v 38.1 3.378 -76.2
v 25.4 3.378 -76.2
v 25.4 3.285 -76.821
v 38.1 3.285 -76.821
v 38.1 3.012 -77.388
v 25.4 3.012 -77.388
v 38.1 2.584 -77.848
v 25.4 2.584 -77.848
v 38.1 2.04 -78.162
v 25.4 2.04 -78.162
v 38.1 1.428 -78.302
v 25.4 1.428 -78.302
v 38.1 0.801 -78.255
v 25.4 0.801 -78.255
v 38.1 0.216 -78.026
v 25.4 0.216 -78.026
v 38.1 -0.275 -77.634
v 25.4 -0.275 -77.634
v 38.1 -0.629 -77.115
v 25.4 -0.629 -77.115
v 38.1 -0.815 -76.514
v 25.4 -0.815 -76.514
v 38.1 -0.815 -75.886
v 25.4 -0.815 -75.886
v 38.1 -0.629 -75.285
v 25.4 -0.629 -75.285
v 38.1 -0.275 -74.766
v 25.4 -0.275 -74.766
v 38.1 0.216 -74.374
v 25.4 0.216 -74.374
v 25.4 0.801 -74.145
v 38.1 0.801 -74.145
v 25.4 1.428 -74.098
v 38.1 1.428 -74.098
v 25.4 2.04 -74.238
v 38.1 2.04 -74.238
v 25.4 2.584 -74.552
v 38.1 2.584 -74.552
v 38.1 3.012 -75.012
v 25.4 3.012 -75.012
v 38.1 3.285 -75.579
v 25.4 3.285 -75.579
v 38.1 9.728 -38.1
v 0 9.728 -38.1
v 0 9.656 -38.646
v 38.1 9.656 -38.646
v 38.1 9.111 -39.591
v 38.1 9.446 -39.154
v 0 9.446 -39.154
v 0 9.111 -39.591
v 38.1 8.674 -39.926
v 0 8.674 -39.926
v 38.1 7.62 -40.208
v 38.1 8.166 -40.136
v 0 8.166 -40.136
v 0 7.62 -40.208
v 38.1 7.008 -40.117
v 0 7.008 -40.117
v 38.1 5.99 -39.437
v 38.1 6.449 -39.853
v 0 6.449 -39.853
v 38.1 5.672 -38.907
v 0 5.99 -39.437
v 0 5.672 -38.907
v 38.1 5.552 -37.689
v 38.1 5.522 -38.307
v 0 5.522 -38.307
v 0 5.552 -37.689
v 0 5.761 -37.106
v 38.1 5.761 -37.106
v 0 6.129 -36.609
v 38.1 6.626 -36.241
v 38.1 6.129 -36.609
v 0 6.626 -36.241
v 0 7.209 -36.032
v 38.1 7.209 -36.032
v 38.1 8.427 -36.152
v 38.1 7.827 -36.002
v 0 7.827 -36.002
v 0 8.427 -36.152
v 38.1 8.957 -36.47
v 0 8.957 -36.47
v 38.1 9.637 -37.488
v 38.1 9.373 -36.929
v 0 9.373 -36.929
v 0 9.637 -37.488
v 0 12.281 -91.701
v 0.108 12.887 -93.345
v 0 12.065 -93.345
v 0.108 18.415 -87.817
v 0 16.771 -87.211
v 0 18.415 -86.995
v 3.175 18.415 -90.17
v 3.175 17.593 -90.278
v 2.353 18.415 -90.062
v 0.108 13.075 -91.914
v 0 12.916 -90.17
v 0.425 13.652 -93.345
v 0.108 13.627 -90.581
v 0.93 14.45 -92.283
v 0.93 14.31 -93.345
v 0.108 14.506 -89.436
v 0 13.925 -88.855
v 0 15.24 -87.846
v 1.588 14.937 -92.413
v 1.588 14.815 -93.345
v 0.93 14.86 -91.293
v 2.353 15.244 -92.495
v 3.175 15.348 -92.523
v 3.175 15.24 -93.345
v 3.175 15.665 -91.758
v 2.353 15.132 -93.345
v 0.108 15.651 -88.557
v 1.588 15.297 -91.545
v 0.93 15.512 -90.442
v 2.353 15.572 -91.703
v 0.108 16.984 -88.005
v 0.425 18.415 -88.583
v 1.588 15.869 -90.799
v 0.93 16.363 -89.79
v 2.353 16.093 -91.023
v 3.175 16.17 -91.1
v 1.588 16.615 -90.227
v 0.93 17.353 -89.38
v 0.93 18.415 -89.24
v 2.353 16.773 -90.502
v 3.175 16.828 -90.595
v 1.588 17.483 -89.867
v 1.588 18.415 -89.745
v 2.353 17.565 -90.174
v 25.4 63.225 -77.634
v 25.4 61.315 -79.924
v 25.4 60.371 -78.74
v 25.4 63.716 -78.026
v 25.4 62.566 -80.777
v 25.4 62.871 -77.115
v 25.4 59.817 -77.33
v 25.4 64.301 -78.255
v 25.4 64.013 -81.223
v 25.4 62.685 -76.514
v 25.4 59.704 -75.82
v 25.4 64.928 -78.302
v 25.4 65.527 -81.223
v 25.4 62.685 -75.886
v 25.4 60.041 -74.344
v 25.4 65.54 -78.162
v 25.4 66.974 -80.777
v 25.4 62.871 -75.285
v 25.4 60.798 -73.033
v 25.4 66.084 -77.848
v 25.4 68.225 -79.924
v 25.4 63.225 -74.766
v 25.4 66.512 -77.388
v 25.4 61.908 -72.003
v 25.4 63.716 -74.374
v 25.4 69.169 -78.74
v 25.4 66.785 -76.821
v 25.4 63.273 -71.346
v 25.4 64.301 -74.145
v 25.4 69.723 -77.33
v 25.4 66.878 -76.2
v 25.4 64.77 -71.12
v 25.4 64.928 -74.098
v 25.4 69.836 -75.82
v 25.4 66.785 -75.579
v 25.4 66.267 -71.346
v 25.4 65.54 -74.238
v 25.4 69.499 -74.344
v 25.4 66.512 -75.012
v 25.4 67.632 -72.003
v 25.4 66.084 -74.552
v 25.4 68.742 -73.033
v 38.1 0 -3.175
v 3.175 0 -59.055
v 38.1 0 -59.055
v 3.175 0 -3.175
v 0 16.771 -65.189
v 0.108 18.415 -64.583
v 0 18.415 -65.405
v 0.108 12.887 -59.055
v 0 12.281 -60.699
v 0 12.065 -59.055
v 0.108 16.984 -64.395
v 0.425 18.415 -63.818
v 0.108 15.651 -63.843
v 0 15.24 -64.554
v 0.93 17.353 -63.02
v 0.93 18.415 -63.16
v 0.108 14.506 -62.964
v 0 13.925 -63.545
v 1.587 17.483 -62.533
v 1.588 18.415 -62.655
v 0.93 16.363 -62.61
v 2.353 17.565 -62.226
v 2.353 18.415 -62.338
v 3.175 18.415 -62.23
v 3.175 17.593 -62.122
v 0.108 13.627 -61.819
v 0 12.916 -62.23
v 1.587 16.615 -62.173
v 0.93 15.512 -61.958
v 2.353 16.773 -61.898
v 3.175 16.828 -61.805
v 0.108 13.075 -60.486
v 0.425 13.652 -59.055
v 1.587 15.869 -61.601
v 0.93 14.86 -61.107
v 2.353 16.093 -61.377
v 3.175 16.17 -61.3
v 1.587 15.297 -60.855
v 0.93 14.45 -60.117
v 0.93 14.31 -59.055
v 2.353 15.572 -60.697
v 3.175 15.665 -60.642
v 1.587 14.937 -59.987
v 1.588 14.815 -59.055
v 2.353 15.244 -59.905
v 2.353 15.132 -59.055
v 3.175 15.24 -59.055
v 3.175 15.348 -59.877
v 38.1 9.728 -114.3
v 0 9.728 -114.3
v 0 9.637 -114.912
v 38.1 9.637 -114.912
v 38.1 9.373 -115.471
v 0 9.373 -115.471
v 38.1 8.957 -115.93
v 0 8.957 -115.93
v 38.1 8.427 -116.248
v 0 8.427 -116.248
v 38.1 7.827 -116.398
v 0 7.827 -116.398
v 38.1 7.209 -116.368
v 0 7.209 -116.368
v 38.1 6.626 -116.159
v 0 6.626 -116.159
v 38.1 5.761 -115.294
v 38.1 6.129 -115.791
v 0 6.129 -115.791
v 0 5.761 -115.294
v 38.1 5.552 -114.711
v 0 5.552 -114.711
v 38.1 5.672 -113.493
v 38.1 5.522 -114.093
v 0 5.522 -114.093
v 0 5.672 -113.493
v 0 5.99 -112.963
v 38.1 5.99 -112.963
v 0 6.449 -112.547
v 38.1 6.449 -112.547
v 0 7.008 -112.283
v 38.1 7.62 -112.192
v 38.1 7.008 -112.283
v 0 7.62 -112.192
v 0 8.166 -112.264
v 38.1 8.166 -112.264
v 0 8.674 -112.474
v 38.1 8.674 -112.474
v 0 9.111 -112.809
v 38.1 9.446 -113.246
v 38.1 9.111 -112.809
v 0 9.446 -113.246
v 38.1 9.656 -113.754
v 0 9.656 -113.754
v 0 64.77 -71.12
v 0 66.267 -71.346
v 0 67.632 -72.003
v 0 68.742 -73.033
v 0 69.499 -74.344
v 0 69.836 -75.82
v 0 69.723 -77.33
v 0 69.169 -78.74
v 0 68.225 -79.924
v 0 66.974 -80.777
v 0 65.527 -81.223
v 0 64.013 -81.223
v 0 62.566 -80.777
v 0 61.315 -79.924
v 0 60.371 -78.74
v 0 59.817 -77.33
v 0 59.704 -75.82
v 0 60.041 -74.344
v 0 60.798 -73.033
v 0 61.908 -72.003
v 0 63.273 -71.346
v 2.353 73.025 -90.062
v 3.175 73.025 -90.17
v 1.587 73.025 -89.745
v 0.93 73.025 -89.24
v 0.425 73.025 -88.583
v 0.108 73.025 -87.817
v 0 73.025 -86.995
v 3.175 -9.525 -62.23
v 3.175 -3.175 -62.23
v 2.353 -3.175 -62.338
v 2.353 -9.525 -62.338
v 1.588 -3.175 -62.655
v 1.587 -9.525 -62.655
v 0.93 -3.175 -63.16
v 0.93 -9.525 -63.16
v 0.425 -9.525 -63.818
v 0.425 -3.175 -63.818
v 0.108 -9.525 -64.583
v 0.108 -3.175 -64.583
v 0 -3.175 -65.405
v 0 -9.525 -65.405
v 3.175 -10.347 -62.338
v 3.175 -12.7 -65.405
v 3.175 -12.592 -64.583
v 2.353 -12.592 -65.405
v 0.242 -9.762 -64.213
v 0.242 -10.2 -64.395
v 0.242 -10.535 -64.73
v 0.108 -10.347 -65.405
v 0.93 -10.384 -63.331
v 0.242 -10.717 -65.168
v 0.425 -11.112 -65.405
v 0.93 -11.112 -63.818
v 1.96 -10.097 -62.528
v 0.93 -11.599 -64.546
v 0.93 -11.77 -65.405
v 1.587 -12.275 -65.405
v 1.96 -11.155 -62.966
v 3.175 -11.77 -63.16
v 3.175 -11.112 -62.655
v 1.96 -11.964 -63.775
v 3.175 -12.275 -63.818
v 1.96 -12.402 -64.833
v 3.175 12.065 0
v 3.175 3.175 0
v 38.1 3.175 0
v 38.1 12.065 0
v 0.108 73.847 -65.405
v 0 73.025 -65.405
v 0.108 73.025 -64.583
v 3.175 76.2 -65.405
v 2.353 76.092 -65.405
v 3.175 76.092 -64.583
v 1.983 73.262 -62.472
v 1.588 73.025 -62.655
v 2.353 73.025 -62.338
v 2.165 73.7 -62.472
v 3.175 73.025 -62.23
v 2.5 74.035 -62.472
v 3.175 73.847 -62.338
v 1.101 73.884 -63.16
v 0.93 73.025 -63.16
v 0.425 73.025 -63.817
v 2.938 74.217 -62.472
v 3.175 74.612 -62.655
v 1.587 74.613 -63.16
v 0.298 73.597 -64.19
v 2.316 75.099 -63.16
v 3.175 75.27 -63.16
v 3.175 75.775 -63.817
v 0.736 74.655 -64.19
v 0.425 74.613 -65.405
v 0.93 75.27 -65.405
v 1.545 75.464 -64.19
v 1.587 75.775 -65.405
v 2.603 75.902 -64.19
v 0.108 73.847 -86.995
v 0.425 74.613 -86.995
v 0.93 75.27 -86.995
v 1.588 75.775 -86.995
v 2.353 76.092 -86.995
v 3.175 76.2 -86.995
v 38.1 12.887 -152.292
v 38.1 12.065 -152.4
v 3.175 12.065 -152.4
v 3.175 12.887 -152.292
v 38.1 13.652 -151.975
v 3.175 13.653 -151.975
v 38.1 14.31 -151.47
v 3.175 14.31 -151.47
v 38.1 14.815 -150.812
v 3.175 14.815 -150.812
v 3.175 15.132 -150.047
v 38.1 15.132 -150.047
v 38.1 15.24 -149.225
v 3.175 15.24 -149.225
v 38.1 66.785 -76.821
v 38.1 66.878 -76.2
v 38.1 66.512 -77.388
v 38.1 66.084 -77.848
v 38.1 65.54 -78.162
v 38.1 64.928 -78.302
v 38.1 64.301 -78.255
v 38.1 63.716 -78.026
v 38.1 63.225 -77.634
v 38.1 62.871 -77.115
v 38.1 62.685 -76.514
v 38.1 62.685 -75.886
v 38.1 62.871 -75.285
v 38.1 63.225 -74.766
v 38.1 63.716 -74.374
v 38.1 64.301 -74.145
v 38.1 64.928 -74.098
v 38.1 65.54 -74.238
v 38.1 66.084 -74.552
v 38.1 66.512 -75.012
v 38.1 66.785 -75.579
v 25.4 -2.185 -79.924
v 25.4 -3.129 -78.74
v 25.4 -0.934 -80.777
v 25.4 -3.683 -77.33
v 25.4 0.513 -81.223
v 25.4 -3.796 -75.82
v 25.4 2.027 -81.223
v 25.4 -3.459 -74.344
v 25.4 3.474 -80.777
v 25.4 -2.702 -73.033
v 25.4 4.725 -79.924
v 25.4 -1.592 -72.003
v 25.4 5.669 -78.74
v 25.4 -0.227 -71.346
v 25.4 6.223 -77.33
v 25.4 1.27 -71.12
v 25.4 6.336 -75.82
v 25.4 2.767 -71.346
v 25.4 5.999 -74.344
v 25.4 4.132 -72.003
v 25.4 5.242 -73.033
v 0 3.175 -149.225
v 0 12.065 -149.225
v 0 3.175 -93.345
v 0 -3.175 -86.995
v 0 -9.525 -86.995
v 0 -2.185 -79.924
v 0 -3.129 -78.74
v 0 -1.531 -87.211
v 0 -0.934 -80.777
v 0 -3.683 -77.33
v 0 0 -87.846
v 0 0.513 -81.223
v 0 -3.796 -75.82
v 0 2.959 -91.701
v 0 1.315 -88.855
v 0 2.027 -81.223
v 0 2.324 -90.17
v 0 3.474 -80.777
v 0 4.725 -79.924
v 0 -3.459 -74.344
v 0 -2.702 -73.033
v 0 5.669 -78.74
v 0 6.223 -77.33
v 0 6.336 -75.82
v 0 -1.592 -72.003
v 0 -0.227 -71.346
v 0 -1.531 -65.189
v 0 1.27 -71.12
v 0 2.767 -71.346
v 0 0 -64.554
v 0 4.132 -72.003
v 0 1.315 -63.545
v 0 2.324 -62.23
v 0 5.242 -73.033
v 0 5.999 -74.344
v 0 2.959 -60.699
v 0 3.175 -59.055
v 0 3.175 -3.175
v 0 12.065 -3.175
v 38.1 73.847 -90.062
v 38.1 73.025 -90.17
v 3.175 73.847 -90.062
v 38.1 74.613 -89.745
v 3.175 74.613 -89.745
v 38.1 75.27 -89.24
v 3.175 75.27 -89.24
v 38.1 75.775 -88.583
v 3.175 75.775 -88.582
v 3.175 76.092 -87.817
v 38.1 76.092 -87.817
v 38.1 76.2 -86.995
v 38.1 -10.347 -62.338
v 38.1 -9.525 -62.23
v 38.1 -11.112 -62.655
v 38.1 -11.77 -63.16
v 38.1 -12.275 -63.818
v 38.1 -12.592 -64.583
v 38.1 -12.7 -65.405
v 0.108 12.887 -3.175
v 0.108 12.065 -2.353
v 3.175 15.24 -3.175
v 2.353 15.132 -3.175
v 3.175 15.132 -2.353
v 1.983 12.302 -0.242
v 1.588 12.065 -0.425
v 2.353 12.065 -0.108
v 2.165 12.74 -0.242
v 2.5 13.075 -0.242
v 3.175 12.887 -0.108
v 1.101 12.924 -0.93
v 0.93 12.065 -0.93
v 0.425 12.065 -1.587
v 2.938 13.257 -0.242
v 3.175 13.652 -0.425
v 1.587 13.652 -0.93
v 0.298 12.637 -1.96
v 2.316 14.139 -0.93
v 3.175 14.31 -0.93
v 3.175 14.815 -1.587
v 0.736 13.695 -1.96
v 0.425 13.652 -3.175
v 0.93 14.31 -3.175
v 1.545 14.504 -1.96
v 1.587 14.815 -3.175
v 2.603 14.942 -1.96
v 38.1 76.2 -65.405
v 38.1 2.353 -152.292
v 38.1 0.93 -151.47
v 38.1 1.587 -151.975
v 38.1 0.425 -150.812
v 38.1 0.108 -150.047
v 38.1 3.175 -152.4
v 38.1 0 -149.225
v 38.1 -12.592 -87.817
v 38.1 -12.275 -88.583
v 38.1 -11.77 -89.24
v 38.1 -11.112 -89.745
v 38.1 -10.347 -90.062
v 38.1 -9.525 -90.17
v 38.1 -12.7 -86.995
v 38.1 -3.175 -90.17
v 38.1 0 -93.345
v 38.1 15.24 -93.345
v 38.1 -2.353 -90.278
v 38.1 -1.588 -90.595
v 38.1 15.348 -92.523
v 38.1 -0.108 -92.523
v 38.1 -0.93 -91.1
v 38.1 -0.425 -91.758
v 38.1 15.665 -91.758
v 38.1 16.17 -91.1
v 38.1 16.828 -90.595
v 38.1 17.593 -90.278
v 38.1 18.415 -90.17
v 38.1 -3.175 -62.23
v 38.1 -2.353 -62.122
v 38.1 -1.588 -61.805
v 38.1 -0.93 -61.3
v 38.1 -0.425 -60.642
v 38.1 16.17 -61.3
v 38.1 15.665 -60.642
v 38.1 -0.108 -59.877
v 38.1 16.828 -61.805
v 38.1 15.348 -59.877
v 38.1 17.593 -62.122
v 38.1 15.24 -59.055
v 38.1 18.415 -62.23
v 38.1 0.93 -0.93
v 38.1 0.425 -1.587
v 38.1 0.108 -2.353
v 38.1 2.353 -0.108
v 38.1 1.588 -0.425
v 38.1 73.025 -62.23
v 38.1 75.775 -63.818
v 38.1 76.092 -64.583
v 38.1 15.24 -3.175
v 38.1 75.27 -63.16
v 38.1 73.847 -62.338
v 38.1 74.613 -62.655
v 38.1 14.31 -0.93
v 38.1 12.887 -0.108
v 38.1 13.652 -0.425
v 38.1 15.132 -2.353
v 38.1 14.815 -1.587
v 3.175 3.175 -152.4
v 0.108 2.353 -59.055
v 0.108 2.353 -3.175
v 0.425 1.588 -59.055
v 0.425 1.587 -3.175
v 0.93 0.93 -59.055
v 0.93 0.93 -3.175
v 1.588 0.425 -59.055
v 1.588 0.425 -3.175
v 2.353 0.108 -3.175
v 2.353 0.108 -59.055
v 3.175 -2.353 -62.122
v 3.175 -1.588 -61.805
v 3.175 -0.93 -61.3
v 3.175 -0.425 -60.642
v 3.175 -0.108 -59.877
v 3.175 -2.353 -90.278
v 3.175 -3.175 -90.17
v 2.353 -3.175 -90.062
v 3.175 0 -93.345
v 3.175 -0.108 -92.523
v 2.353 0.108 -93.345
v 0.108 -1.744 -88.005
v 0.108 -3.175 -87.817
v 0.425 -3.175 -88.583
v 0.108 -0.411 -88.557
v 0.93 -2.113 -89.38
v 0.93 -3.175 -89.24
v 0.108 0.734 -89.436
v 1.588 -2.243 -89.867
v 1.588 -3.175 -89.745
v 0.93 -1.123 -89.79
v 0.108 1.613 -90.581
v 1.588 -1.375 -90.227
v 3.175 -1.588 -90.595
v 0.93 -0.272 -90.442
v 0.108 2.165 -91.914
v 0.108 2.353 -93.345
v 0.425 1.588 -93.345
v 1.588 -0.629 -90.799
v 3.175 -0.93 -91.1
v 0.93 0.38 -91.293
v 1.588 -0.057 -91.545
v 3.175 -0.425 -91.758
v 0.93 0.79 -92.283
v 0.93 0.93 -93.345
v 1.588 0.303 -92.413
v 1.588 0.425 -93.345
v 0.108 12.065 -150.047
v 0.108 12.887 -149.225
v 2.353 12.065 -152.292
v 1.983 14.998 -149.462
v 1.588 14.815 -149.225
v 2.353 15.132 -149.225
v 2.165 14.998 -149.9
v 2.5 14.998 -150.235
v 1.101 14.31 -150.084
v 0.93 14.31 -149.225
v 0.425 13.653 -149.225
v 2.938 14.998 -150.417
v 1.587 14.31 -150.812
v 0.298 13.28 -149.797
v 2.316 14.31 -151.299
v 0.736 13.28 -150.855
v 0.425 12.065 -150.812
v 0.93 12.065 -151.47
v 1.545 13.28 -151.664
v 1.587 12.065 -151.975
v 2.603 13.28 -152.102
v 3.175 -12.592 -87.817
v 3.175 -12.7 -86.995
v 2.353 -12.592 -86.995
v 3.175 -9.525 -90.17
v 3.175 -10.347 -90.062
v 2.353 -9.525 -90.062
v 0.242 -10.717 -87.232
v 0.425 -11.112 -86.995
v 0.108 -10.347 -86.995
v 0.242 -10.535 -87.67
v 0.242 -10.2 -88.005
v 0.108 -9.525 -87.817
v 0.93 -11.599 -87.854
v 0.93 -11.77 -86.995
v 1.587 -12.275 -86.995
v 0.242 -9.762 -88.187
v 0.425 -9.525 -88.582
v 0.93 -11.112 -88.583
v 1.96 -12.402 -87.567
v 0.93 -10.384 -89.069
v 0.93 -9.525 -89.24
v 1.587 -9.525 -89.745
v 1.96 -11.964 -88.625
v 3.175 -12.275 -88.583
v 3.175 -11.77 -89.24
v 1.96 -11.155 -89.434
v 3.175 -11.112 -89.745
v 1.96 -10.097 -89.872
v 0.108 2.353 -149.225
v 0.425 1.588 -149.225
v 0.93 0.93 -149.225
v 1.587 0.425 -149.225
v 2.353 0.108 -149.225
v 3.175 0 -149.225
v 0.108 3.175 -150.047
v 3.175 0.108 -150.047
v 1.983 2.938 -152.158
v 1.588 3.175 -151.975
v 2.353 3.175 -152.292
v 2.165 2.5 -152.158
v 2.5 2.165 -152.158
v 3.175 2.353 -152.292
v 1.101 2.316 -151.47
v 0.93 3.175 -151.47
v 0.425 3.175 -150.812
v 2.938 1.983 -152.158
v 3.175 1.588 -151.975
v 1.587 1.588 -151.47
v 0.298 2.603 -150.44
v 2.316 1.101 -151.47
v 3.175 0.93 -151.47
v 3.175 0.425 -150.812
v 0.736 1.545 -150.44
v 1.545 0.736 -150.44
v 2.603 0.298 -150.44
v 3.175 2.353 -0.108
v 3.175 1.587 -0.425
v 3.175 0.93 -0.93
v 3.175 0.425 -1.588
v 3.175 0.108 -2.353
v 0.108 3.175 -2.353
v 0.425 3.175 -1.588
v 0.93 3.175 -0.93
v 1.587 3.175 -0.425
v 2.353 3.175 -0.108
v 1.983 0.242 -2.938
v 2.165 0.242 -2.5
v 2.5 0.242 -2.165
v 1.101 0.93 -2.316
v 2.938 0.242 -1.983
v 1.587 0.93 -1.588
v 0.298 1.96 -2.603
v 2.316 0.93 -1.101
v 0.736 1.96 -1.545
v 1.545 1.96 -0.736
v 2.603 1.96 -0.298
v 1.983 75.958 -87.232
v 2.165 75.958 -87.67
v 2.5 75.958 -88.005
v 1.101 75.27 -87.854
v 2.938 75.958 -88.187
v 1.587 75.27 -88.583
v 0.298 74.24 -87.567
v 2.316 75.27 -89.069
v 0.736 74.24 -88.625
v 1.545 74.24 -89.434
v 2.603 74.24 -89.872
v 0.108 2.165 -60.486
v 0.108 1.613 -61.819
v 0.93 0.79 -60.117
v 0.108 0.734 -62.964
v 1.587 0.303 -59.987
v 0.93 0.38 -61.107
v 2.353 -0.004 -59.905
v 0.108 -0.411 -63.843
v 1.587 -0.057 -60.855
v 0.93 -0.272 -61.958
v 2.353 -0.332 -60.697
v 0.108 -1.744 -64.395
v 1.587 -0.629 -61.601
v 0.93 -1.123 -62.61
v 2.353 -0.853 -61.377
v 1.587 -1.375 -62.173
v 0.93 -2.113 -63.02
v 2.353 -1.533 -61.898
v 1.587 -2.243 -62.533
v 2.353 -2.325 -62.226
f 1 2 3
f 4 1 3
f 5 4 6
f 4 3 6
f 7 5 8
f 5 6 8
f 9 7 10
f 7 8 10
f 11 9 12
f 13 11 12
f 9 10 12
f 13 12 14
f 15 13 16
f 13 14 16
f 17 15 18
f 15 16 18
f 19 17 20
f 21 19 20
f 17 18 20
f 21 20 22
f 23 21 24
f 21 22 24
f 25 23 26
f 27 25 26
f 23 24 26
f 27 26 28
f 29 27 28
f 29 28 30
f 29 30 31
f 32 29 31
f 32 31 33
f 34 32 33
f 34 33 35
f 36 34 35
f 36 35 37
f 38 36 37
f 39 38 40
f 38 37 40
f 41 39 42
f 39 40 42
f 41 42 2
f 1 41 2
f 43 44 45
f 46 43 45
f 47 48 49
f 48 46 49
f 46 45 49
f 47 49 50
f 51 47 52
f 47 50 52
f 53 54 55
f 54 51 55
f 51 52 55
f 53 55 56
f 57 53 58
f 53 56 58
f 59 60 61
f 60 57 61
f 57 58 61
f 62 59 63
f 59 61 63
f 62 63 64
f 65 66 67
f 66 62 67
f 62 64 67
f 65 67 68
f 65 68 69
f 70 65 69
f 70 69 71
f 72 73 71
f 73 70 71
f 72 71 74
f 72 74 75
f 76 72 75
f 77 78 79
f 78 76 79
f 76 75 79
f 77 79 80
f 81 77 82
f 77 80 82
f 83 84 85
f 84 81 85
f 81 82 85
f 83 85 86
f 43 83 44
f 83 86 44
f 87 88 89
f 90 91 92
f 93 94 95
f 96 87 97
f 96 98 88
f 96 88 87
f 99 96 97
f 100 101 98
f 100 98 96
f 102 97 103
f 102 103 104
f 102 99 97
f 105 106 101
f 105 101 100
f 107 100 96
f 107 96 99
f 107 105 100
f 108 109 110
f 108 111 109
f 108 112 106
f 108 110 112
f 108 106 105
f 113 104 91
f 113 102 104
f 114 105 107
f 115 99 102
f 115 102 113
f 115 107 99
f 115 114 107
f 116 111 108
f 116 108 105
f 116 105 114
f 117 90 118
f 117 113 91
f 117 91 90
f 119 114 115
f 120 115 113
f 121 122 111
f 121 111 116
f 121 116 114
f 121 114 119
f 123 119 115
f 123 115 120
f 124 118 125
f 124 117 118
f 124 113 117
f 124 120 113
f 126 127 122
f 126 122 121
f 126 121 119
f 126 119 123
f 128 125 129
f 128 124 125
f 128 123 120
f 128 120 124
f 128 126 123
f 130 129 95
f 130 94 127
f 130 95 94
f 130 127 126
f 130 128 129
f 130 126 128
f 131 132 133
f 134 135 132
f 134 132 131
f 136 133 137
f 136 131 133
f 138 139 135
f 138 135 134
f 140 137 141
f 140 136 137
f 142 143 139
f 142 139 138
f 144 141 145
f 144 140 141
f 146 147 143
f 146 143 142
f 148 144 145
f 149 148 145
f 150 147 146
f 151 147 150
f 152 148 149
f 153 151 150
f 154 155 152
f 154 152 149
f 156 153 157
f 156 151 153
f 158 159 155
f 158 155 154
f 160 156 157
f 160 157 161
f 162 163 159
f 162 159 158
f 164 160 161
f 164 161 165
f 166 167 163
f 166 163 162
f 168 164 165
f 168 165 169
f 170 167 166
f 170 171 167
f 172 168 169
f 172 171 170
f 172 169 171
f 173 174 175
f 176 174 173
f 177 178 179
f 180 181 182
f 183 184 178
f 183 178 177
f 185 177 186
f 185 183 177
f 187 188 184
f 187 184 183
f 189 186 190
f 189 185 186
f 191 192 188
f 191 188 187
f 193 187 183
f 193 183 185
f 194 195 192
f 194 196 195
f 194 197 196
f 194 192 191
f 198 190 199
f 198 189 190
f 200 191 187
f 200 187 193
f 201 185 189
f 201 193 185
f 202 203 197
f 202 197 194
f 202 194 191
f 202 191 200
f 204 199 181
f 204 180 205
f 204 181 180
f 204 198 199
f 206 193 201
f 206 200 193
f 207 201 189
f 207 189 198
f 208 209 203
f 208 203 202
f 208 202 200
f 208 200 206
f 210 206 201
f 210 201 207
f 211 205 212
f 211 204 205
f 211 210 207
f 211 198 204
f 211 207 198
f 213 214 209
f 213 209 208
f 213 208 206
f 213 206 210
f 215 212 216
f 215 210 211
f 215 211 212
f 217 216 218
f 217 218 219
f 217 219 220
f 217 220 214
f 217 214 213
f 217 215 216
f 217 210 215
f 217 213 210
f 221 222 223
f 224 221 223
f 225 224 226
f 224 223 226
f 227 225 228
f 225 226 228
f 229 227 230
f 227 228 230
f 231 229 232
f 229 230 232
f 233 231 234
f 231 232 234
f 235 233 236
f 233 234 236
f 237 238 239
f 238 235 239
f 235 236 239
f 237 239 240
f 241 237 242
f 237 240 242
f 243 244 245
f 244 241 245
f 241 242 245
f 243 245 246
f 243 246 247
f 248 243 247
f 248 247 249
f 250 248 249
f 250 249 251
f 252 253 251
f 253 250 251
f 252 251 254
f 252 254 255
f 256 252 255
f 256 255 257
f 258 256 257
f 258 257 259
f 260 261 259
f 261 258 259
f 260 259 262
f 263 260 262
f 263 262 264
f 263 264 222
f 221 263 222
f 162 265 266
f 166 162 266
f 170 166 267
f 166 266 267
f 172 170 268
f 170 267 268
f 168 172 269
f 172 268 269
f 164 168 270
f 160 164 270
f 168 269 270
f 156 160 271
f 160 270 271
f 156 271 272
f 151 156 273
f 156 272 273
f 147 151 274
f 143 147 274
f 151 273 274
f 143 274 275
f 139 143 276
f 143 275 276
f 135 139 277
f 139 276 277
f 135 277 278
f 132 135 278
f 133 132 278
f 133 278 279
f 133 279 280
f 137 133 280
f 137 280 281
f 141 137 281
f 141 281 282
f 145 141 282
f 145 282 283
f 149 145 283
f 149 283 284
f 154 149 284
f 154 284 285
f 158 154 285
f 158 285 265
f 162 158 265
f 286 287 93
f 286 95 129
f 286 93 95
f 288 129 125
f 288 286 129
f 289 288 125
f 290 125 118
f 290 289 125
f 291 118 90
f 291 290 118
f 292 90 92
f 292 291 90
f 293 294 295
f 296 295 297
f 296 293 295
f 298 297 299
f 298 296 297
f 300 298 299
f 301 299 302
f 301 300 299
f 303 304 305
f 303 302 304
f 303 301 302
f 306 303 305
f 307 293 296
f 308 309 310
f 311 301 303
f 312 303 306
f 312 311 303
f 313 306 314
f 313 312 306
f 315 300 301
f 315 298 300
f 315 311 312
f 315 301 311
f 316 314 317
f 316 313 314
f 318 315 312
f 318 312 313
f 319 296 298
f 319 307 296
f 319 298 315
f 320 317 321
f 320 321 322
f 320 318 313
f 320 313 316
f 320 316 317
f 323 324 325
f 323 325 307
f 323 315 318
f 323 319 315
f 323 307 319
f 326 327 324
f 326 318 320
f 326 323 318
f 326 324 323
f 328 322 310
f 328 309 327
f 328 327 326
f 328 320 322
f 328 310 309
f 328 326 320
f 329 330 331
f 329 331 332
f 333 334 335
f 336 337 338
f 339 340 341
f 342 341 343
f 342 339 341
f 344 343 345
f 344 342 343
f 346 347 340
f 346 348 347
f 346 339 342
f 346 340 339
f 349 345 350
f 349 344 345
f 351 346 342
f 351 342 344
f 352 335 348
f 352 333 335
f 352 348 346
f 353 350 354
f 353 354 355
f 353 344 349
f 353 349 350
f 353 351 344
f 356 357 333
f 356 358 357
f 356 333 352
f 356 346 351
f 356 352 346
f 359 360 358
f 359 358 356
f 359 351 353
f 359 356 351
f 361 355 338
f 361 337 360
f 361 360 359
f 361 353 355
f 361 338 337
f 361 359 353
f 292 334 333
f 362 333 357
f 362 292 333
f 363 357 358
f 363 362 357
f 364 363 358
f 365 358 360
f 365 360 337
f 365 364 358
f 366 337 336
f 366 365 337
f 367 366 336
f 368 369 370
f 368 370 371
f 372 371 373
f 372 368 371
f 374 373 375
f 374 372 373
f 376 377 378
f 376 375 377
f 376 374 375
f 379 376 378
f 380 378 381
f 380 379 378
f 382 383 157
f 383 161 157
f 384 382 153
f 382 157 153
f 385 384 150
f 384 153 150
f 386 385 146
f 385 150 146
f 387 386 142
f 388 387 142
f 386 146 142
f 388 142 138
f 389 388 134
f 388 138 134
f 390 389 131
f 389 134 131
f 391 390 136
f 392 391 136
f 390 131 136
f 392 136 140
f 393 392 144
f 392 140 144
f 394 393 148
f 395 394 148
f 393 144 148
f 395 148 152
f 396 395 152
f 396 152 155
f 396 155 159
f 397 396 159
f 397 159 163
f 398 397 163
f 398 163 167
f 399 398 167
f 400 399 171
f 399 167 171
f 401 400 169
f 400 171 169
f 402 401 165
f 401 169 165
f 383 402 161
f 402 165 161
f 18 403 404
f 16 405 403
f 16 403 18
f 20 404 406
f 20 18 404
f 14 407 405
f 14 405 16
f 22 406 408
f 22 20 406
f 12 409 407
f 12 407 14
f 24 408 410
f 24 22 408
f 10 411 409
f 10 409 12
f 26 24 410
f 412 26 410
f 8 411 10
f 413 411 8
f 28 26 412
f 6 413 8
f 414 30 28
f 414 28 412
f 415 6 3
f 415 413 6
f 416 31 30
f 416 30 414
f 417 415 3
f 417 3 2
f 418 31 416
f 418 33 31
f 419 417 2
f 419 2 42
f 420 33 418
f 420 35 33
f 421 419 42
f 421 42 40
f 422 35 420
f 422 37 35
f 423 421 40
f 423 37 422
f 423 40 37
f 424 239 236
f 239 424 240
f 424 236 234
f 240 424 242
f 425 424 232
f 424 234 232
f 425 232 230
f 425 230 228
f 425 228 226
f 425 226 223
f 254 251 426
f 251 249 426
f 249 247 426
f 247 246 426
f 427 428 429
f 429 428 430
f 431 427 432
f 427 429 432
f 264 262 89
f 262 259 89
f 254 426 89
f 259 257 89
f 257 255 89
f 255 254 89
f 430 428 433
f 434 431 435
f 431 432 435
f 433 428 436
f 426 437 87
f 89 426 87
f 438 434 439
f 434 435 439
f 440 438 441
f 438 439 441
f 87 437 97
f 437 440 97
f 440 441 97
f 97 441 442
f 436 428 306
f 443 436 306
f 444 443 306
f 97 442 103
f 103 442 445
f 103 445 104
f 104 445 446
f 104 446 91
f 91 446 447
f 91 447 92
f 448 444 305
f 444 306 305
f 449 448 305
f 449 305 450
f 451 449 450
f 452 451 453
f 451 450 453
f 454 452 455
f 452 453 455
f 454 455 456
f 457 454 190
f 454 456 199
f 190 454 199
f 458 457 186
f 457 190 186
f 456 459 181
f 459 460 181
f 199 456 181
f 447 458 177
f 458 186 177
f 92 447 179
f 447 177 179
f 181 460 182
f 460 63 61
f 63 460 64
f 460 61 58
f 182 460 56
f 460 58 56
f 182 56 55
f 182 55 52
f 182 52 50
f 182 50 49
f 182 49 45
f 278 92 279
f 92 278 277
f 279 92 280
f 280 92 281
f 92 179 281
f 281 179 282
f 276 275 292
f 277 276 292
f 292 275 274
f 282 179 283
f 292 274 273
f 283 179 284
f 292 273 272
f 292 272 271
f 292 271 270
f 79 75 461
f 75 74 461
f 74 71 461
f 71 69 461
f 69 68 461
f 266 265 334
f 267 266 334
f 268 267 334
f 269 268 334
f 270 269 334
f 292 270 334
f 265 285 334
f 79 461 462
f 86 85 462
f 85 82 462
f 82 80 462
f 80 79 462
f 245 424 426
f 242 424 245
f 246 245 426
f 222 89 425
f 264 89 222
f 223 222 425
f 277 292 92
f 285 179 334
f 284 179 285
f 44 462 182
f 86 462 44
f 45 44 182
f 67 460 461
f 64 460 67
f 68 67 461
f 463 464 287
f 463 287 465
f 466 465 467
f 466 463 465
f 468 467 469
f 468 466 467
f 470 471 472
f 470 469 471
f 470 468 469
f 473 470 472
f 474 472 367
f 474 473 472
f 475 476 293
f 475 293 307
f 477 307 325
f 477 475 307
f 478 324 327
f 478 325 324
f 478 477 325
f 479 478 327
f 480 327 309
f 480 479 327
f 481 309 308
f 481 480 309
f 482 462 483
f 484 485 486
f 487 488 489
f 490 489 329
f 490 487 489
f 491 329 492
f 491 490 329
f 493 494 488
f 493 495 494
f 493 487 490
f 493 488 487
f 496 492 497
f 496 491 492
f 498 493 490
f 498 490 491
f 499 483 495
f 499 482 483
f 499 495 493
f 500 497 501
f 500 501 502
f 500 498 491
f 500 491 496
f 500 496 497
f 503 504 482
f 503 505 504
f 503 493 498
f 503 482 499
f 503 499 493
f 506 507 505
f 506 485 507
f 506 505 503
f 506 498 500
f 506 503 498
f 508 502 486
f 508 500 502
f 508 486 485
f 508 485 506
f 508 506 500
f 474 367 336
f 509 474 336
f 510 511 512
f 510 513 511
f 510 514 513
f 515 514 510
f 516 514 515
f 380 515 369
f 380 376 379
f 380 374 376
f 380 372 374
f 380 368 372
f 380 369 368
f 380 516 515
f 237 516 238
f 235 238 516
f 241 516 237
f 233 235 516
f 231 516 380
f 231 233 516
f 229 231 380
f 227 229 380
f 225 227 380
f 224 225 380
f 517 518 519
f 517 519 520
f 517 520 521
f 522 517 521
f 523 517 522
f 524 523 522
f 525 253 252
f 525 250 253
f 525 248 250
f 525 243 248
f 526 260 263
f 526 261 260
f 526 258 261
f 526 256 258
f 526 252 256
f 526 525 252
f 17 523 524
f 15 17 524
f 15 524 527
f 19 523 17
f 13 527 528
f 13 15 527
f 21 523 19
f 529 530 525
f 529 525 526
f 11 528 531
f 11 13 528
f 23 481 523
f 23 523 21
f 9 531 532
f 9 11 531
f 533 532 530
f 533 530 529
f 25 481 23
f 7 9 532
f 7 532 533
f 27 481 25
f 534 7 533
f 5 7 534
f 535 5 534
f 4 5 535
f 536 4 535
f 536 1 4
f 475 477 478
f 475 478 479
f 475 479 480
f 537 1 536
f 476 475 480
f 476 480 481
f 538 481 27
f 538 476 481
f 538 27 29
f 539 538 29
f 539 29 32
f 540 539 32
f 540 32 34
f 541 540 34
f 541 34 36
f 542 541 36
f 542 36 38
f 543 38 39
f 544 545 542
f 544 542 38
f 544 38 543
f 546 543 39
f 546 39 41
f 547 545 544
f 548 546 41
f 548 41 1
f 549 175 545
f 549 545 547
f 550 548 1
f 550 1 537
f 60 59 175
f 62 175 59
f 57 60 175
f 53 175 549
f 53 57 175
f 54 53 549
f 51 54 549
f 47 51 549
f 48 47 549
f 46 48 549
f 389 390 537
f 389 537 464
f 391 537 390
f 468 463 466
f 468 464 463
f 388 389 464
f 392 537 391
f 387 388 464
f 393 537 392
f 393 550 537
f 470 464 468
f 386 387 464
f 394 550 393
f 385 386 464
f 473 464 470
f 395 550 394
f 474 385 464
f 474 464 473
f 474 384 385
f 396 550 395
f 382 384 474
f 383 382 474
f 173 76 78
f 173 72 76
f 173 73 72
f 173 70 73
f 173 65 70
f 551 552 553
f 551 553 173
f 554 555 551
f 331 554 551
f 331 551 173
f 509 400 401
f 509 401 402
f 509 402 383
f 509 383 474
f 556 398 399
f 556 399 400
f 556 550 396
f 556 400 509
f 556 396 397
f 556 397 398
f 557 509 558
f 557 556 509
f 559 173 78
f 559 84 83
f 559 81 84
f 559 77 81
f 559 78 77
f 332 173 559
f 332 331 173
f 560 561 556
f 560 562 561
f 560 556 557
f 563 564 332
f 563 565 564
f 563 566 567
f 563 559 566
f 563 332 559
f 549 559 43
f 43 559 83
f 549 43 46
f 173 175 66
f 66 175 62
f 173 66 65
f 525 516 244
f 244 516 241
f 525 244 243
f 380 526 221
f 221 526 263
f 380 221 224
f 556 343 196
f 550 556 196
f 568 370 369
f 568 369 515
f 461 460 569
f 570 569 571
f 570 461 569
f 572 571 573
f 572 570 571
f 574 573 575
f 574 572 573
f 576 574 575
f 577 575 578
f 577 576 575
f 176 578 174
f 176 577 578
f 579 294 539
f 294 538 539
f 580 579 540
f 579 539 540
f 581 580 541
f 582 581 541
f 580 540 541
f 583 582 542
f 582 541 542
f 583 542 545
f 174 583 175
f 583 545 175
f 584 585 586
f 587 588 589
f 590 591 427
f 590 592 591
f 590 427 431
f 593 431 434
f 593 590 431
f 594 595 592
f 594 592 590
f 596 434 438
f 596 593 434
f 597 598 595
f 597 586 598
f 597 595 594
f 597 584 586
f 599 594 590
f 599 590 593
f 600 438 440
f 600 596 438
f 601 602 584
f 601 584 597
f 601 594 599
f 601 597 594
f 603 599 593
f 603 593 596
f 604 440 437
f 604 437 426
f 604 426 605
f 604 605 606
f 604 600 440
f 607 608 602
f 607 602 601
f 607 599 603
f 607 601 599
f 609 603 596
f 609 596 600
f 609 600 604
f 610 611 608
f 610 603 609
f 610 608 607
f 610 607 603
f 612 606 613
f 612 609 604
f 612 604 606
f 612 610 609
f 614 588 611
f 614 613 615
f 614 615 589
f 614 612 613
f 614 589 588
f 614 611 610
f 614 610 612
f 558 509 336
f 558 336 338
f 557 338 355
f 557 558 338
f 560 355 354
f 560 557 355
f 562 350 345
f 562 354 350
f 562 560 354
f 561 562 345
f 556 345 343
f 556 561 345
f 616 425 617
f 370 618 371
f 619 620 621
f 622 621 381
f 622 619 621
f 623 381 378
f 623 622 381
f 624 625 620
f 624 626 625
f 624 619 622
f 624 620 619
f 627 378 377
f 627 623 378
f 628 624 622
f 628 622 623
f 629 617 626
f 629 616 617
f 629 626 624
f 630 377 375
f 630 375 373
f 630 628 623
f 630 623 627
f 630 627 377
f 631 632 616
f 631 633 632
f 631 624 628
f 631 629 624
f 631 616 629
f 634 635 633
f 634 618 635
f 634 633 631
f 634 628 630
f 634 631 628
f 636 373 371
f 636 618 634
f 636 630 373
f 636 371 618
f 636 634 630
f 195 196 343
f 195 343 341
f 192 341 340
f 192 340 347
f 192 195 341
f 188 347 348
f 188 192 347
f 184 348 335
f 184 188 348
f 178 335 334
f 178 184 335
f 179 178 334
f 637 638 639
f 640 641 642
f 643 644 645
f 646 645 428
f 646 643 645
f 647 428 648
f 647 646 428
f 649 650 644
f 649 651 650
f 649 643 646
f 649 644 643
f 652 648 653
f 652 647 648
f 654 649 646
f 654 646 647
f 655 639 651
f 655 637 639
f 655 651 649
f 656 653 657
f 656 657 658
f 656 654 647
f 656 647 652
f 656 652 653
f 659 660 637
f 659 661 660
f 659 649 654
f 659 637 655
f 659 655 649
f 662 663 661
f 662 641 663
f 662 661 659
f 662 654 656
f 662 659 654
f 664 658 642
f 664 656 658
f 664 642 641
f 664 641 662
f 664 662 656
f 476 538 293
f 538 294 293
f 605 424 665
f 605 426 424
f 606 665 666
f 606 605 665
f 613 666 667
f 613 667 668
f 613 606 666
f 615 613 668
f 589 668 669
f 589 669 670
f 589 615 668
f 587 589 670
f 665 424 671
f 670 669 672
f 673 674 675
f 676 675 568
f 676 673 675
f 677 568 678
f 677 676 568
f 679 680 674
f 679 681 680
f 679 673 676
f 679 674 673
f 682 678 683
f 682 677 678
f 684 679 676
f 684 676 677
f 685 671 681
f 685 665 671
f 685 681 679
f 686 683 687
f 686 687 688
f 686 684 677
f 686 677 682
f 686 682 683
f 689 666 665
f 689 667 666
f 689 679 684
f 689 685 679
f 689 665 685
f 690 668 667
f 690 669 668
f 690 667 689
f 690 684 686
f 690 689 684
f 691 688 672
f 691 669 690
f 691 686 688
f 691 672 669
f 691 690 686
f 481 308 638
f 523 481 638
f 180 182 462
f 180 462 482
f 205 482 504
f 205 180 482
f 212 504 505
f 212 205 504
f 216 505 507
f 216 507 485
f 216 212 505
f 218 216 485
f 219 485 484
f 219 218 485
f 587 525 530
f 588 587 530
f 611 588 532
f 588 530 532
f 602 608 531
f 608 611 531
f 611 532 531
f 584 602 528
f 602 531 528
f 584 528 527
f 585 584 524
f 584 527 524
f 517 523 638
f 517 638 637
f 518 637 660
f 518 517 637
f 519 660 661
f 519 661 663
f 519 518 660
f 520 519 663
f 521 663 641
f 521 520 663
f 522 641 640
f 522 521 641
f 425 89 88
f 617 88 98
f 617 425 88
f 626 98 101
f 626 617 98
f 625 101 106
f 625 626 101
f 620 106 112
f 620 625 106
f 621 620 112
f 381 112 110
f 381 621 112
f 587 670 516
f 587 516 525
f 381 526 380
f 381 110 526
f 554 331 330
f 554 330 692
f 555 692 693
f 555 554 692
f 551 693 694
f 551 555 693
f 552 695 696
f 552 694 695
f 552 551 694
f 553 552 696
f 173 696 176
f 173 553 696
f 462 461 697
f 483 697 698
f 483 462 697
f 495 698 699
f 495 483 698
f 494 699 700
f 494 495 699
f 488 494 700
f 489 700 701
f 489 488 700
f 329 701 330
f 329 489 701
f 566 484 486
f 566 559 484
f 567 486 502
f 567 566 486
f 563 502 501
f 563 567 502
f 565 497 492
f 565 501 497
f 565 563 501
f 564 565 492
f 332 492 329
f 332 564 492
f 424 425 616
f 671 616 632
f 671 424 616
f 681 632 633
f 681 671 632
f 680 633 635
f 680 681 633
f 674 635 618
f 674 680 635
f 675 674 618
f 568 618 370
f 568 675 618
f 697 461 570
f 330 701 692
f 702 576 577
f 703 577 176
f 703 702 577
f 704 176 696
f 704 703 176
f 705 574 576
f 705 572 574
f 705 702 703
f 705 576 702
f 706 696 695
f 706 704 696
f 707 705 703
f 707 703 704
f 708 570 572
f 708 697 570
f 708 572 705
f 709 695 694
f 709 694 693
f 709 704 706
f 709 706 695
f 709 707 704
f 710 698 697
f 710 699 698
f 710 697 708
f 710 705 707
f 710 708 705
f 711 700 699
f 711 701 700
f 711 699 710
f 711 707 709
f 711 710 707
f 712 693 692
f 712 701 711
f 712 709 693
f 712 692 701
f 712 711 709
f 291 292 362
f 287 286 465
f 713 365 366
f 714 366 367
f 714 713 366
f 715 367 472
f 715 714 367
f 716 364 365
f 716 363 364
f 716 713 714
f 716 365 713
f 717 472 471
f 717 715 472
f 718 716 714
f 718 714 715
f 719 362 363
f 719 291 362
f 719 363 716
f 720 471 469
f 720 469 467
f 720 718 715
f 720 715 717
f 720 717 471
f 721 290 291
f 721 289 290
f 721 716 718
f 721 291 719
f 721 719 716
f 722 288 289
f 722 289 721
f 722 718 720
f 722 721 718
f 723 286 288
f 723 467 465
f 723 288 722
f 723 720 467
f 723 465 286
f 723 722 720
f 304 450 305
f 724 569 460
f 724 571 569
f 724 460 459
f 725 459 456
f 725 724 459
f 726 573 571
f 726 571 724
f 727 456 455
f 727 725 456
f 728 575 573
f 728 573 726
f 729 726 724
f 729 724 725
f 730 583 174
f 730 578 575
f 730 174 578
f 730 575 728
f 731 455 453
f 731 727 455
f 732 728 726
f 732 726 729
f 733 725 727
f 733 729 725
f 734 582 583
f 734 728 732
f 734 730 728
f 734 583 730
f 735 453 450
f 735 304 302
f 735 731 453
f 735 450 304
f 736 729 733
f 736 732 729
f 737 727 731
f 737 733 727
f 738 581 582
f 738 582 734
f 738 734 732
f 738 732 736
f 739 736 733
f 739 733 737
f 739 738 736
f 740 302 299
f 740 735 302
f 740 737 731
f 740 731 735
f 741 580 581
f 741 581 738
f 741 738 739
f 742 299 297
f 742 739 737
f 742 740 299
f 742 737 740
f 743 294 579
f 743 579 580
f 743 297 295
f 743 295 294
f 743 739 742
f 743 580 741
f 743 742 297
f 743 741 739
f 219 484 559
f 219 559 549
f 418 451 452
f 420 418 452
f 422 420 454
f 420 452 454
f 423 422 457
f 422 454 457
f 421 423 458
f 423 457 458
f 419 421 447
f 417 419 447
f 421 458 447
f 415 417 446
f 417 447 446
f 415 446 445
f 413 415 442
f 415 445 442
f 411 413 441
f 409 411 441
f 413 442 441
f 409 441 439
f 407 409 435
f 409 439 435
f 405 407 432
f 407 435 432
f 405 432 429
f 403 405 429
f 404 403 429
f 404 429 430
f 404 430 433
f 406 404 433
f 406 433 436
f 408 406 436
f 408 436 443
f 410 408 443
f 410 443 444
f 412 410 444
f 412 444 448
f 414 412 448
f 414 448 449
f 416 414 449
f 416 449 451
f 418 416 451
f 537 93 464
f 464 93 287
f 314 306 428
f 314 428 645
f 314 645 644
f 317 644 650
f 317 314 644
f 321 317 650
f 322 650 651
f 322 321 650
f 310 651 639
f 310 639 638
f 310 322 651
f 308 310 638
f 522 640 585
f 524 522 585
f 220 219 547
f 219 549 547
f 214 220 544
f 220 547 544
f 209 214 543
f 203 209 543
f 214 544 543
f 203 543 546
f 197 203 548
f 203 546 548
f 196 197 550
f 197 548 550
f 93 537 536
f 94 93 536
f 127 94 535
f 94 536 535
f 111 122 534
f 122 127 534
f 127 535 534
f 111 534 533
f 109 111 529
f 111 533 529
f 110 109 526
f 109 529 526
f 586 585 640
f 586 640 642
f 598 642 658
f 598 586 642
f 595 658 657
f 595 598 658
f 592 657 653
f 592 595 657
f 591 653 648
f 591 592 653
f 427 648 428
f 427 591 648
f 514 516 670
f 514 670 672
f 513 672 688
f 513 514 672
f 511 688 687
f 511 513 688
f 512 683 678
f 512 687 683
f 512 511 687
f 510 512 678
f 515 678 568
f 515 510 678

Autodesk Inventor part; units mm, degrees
ref_plane "YZ Plane" through (0, 0, 0) normal (1, 0, 0) x (0, 1, 0)
ref_plane "XZ Plane" through (0, 0, 0) normal (0, 1, 0) x (-1, 0, 0)
ref_plane "XY Plane" through (0, 0, 0) normal (0, 0, 1) x (1, 0, 0)
sketch "Sketch1" plane through (0, 0, 0) normal (1, 0, 0) x (0, 1, 0)
  line L0 (0, 0) -> (15.24, 0)
  line L1 (15.24, 0) -> (15.24, -152.4)
  line L2 (15.24, -152.4) -> (0, -152.4)
  line L3 (0, -152.4) -> (0, 0)
  line L4 (15.24, -76.2) -> (0, -76.2)
  line L5 (7.62, -76.2) -> (7.62, -114.3)
  line L6 (7.62, -76.2) -> (7.62, -38.1)
  circle A0 centre (7.62, -38.1) radius 2.1082
  circle A1 centre (7.62, -114.3) radius 2.1082
  line L7 (0, -76.2) -> (76.2, -76.2)
  line L8 (76.2, -76.2) -> (76.2, -90.17)
  line L9 (76.2, -90.17) -> (76.2, -62.23)
  line L10 (76.2, -62.23) -> (0, -62.23)
  line L11 (0, -62.23) -> (0, -90.17)
  line L12 (0, -90.17) -> (76.2, -90.17)
  line L13 (76.2, -90.17) -> (76.2, -62.23)
  line L14 (76.2, -76.2) -> (64.77, -76.2)
  circle A2 centre (64.77, -76.2) radius 2.1082
  line L15 (0, -62.23) -> (-12.7, -62.23)
  line L16 (-12.7, -62.23) -> (-12.7, -90.17)
  line L17 (-12.7, -90.17) -> (0, -90.17)
  line L18 (0, -90.17) -> (0, -62.23)
  line L19 (-12.7, -76.2) -> (1.27, -76.2)
  circle A3 centre (1.27, -76.2) radius 2.1082
  point P0 (15.24, -62.23)
  point P1 (15.24, -90.17)
  point P2 (0, -62.23)
  dimension "d0" = 152.4
  dimension "d1" = 15.24
  dimension "d2" = 38.1
  dimension "d3" = 38.1
  dimension "d4" = 4.2164
  dimension "d5" = 4.2164
  dimension "d6" = 76.2
  dimension "d7" = 13.97
  dimension "d8" = 27.94
  dimension "d12" = 11.43
  dimension "d13" = 4.2164
  dimension "d14" = 12.7
  dimension "d15" = 13.97
  dimension "d16" = 4.2164
extrude "Extrusion1" add sketch "Sketch1" along normal blind 38.1 contours L0 L1 L10 L3 | L10 L6 L4 A3 L3 | L3 A3 L19 L16 L15 | L10 L9 L7 A2 L1 | L1 L4 L6 L10 | L7 A2 L8 L12 L1 | L1 L12 L5 L4 | L4 L5 L12 L3 A3 | A3 L3 L17 L16 L19 | L1 L2 L3 L12
fillet "Fillet1" radius 3.175 24 edges at (0, 15.24, -31.115) (0, 7.62, 0) (0, 0, -121.285) (0, 0, -31.115) (0, 7.62, -152.4) (0, 15.24, -121.285) (0, 45.72, -90.17) (0, 76.2, -83.185) (0, 45.72, -62.23) (19.05, 15.24, 0) (19.05, 76.2, -62.23) (19.05, 15.24, -62.23) (19.05, 76.2, -90.17) (19.05, 15.24, -90.17) (19.05, 15.24, -152.4) (19.05, 0, -152.4) (19.05, 0, 0) (19.05, 0, -62.23) (19.05, -12.7, -62.23) (19.05, -12.7, -90.17) (19.05, 0, -90.17) (0, -12.7, -76.2) (0, -6.35, -62.23) (0, -6.35, -90.17)
sketch "Sketch2" plane through (0, 0, 0) normal (-1, 0, 0) x (0, 0, 1)
  circle A0 centre (-76.2, 1.27) radius 2.1082 projected
  circle A1 centre (-76.2, 1.27) radius 5.08
  circle A2 centre (-76.2, 64.77) radius 2.1082 projected
  circle A3 centre (-76.2, 64.77) radius 5.08
  point P0 (0, 0)
  dimension "d17" = 10.16
  dimension "d18" = 10.16
extrude "Extrusion2" cut sketch "Sketch2" against normal blind 25.4
properties part number "brain mount"
